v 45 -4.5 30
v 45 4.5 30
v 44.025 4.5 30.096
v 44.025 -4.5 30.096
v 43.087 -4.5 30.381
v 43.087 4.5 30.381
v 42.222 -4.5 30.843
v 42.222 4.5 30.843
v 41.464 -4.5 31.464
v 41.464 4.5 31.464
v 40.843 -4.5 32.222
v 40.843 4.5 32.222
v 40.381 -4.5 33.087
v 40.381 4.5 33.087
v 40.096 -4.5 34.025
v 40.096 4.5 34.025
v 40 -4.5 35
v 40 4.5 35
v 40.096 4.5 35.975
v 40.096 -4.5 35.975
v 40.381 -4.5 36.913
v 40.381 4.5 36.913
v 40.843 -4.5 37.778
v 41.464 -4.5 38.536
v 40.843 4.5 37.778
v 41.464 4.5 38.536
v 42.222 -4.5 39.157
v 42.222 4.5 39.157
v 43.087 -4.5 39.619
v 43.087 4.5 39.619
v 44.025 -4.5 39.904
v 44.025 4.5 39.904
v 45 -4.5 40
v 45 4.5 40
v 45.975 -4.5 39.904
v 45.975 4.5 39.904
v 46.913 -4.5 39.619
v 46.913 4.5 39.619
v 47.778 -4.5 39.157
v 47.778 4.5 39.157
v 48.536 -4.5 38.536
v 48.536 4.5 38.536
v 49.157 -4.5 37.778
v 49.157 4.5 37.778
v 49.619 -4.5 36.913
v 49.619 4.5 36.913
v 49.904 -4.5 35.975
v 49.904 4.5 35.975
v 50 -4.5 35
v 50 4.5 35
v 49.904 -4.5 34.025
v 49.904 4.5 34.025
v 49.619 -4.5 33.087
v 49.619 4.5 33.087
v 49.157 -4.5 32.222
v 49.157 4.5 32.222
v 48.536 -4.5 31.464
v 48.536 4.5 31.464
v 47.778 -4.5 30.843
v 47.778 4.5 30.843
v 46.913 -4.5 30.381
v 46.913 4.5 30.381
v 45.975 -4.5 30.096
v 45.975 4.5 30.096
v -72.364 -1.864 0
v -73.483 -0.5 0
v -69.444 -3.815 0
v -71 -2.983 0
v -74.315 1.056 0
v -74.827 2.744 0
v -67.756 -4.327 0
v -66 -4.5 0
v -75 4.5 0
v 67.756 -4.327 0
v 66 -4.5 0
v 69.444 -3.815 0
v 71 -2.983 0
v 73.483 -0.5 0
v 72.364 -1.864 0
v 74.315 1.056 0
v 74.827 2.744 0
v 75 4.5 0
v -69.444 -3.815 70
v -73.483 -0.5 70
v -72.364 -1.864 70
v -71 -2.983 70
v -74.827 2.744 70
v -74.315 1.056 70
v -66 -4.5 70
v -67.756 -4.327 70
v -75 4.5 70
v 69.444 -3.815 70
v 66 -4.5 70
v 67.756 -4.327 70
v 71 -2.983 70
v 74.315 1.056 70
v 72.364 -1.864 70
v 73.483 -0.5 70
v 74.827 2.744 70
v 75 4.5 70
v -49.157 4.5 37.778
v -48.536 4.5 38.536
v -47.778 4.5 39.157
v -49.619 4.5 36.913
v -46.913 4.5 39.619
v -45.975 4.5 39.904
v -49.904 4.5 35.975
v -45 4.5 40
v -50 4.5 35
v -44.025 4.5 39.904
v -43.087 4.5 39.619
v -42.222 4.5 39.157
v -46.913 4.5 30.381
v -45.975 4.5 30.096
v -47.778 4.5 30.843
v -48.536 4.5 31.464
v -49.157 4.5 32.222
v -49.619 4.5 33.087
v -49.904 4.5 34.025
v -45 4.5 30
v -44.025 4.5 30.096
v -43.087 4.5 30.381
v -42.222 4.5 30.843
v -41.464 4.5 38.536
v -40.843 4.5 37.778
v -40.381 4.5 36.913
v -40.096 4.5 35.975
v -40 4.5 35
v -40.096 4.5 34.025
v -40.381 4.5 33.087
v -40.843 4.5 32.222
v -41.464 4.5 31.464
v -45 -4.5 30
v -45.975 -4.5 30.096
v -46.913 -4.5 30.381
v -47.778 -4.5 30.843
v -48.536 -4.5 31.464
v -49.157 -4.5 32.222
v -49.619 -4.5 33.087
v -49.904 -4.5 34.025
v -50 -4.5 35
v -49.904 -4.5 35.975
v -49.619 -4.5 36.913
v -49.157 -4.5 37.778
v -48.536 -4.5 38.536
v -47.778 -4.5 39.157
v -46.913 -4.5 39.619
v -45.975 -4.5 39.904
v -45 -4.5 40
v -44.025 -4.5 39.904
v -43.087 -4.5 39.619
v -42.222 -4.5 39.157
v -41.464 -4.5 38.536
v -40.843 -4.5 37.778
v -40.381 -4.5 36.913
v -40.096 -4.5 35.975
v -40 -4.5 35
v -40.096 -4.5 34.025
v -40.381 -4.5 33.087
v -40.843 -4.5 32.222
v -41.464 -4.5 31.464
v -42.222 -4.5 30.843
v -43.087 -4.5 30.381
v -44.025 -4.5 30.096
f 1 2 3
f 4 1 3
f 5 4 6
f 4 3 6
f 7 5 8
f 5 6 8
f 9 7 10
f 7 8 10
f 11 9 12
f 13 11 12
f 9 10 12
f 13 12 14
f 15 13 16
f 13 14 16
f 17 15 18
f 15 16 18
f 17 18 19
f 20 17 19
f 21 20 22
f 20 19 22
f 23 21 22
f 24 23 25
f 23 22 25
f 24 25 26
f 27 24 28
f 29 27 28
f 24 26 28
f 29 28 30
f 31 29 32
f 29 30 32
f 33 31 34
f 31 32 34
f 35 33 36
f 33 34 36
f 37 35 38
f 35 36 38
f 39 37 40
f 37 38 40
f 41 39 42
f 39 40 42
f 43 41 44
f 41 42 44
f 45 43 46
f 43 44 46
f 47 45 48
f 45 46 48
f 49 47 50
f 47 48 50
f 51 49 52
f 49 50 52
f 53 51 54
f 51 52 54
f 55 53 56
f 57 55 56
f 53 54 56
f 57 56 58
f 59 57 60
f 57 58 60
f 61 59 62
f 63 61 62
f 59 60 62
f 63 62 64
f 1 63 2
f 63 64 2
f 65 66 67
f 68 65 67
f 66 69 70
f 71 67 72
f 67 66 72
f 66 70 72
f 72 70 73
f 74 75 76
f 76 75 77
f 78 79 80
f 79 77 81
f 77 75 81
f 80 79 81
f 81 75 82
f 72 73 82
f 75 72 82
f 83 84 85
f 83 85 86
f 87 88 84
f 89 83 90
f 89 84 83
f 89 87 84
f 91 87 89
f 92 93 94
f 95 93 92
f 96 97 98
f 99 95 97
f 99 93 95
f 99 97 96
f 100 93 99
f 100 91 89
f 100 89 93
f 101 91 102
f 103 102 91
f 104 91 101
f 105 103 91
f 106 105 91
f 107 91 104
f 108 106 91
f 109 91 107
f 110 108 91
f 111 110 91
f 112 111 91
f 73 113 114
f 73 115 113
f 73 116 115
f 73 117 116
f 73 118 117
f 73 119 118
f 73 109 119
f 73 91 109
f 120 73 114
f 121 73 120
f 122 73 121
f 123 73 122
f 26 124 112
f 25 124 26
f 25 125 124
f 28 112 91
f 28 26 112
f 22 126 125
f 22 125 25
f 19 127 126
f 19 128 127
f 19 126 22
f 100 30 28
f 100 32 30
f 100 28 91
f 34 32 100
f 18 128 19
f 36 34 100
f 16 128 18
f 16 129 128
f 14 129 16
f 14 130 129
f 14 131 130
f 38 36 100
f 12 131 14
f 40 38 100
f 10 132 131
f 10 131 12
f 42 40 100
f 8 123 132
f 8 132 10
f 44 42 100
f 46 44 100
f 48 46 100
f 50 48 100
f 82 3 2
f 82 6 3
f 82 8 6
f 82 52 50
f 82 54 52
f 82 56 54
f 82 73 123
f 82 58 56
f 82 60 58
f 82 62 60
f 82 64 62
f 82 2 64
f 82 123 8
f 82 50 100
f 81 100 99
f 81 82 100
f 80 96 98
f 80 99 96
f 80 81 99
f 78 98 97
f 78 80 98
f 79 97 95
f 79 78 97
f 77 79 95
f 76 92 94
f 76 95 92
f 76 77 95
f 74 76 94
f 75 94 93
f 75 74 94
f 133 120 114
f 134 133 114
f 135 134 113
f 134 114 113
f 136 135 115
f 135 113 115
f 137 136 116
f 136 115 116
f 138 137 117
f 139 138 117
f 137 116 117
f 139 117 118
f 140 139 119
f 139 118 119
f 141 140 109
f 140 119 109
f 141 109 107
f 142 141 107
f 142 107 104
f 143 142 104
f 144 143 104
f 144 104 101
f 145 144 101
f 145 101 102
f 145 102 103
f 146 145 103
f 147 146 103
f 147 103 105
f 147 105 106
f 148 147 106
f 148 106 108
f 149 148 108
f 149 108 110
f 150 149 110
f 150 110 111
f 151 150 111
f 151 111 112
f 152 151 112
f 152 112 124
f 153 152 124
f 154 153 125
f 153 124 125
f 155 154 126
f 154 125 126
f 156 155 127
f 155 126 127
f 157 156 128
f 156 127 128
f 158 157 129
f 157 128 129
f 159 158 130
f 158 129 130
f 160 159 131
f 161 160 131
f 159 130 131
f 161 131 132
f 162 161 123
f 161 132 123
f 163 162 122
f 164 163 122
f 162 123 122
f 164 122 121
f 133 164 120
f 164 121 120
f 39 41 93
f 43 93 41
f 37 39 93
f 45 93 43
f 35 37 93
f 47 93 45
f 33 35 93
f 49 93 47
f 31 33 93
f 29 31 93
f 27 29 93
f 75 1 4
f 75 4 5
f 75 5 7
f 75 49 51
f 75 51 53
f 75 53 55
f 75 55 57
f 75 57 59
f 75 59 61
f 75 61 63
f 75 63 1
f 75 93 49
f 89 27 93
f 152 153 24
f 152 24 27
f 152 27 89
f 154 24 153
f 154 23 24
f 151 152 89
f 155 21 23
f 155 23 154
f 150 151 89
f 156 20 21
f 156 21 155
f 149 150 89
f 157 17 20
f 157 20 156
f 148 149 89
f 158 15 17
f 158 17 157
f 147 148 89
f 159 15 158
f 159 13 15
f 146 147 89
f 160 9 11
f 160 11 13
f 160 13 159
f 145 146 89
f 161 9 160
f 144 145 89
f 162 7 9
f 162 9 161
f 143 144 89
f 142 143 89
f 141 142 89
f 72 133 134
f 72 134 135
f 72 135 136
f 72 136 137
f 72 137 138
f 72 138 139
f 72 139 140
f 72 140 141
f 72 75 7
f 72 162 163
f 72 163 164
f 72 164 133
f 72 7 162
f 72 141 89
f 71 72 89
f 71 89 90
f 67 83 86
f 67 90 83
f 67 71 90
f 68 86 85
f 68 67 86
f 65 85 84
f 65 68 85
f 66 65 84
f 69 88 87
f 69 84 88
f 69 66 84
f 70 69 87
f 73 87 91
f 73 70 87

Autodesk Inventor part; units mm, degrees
ref_plane "YZ Plane" through (0, 0, 0) normal (1, 0, 0) x (0, 1, 0)
ref_plane "XZ Plane" through (0, 0, 0) normal (0, 1, 0) x (-1, 0, 0)
ref_plane "XY Plane" through (0, 0, 0) normal (0, 0, 1) x (1, 0, 0)
sketch "Schizzo1" plane through (0, 0, 0) normal (0, 0, 1) x (1, 0, 0)
  line L0 (-75, 4.5) -> (75, 4.5)
  line L1 (75, 4.5) -> (75, -4.5)
  line L2 (75, -4.5) -> (-75, -4.5)
  line L3 (-75, -4.5) -> (-75, 4.5)
  line L4 (-75, 4.5) -> (75, -4.5) construction
  line L5 (75, 4.5) -> (-75, -4.5) construction
  arc A0 (-75, 4.5) -> (-66, -4.5) centre (-66, 4.5) ccw
  arc A1 (66, -4.5) -> (75, 4.5) centre (66, 4.5) ccw
  point P0 (0, 0)
  dimension "d0" = 150
  dimension "d1" = 9
  dimension "d3" = 9
  dimension "d4" = 9
extrude "Estrusione1" add sketch "Schizzo1" along normal blind 70 contours L0 A1 L2 A0
sketch "Schizzo2" plane through (-66, -4.5, 0) normal (0, -1, 0) x (1, 0, 0)
  line L0 (141, 0) -> (141, 70) projected
  line L1 (-9, 0) -> (-9, 70) projected
  point P0 (66, 0)
  point P1 (21, 35)
  point P2 (111, 35)
  point P3 (141, 35)
  dimension "d7" = 30
  dimension "d8" = 30
  dimension "d16" = 90
hole "Foro1" at (-45, -4.5, 35) at (45, -4.5, 35) direction (0, 1, 0) diameter 10 end through all
properties part number "Spessore plastica"
